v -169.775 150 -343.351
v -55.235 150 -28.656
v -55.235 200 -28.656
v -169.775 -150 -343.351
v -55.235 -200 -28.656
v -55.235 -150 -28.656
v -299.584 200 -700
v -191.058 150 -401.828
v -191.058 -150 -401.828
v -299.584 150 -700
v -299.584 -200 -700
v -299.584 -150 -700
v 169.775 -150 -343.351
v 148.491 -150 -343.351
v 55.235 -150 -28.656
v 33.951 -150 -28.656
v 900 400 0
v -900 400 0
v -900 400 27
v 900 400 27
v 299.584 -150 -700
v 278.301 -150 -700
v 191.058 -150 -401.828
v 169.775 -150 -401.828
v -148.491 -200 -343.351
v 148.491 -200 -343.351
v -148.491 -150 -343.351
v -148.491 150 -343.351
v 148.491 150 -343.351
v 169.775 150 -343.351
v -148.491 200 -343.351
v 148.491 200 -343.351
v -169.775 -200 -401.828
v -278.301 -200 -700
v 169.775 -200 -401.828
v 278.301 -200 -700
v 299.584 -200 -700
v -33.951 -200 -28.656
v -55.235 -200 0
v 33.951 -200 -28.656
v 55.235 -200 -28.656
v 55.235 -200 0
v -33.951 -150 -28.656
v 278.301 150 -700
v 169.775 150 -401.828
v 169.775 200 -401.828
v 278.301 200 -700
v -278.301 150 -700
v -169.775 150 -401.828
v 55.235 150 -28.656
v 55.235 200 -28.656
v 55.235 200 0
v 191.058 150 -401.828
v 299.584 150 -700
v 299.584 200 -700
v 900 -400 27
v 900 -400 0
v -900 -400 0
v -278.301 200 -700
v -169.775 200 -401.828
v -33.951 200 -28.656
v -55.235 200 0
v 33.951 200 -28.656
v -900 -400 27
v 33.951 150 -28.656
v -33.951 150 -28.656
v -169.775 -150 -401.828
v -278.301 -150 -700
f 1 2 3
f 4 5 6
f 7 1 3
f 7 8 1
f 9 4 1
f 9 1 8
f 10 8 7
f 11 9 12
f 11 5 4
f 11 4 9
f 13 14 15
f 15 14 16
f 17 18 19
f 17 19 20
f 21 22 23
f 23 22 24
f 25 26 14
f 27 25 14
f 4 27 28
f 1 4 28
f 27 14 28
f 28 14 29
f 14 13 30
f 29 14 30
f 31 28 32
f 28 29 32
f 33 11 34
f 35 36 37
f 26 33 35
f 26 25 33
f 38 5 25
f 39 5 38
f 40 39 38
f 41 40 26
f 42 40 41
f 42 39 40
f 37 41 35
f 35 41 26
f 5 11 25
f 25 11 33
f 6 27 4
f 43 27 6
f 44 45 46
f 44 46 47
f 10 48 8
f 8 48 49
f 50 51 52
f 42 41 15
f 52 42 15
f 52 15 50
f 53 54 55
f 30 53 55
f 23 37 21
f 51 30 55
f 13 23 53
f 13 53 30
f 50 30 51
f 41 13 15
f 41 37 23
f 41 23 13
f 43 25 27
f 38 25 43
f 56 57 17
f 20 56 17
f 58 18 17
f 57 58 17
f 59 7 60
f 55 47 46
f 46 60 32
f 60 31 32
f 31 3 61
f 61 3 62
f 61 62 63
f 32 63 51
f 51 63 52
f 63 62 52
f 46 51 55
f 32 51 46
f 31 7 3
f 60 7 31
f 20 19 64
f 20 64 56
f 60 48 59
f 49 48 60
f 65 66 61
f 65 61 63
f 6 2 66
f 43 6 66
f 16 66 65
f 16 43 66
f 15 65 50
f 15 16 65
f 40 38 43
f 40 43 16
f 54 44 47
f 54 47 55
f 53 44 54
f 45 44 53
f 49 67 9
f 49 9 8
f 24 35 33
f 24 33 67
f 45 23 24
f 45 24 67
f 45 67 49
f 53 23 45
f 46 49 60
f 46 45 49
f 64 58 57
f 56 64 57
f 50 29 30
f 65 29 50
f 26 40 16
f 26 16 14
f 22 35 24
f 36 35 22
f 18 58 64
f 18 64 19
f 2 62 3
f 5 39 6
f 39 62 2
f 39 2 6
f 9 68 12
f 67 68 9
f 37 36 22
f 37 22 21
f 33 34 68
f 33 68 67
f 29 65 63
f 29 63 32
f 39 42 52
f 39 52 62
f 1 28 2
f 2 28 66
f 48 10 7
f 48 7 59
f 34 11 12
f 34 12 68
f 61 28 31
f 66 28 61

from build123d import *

# Parameters (mm, degrees)
F0_W          = 1800
F0_H          = 800
F1_DEPTH      = 27
F3_DEPTH      = 200
F4_W          = 300
F4_H          = 314.6957938282
F4_H_2        = 298.1724899121
F5_DEPTH      = 900.001
F5_DEPTH_BACK = 900.001


with BuildPart() as f1:
    # F0 (on Top) → F1 (new body)
    with BuildSketch(Plane.XY):
        Rectangle(F0_W, F0_H)
    extrude(amount=F1_DEPTH)


with BuildPart() as f3:
    # F2 (on Front) → F3 (new body, symmetric)
    with BuildSketch(Plane.XZ):
        Polygon((-169.7746314183, -401.8275100879), (-169.7746314183, -343.3514220846), (-299.5840978729, -700), (-278.3005424234, -700), align=None)
        Polygon((-33.9511741666, -28.6556282564), (-55.2347296161, -28.6556282564), (-169.7746314183, -343.3514220846), (-148.4910759688, -343.3514220846), align=None)
        Polygon((-148.4910759688, -343.3514220846), (-169.7746314183, -343.3514220846), (-169.7746314183, -401.8275100879), align=None)
        Polygon((55.2347296161, 0), (-55.2347296161, 0), (-55.2347296161, -28.6556282564), (-33.9511741666, -28.6556282564), (33.9511741666, -28.6556282564), (55.2347296161, -28.6556282564), align=None)
        Polygon((169.7746314183, -343.3514220846), (55.2347296161, -28.6556282564), (33.9511741666, -28.6556282564), (148.4910759688, -343.3514220846), align=None)
        Polygon((169.7746314183, -401.8275100879), (169.7746314183, -343.3514220846), (148.4910759688, -343.3514220846), align=None)
        Polygon((299.5840978729, -700), (169.7746314183, -343.3514220846), (169.7746314183, -401.8275100879), (278.3005424234, -700), align=None)
        Polygon((148.4910759688, -343.3514220846), (-148.4910759688, -343.3514220846), (-169.7746314183, -401.8275100879), (169.7746314183, -401.8275100879), align=None)
    extrude(amount=F3_DEPTH, both=True)

    # F4 (on Right) → F5 (cut, two sides)
    with BuildSketch(Plane.YZ) as f5_sk:
        with Locations((0, -186.0035251705)):
            Rectangle(F4_W, F4_H)
        with Locations((0, -550.9137550439)):
            Rectangle(F4_W, F4_H_2)
    extrude(amount=-F5_DEPTH, mode=Mode.SUBTRACT)
    extrude(f5_sk.sketch, amount=F5_DEPTH_BACK, mode=Mode.SUBTRACT)


solid = Compound([f1.part, f3.part])
